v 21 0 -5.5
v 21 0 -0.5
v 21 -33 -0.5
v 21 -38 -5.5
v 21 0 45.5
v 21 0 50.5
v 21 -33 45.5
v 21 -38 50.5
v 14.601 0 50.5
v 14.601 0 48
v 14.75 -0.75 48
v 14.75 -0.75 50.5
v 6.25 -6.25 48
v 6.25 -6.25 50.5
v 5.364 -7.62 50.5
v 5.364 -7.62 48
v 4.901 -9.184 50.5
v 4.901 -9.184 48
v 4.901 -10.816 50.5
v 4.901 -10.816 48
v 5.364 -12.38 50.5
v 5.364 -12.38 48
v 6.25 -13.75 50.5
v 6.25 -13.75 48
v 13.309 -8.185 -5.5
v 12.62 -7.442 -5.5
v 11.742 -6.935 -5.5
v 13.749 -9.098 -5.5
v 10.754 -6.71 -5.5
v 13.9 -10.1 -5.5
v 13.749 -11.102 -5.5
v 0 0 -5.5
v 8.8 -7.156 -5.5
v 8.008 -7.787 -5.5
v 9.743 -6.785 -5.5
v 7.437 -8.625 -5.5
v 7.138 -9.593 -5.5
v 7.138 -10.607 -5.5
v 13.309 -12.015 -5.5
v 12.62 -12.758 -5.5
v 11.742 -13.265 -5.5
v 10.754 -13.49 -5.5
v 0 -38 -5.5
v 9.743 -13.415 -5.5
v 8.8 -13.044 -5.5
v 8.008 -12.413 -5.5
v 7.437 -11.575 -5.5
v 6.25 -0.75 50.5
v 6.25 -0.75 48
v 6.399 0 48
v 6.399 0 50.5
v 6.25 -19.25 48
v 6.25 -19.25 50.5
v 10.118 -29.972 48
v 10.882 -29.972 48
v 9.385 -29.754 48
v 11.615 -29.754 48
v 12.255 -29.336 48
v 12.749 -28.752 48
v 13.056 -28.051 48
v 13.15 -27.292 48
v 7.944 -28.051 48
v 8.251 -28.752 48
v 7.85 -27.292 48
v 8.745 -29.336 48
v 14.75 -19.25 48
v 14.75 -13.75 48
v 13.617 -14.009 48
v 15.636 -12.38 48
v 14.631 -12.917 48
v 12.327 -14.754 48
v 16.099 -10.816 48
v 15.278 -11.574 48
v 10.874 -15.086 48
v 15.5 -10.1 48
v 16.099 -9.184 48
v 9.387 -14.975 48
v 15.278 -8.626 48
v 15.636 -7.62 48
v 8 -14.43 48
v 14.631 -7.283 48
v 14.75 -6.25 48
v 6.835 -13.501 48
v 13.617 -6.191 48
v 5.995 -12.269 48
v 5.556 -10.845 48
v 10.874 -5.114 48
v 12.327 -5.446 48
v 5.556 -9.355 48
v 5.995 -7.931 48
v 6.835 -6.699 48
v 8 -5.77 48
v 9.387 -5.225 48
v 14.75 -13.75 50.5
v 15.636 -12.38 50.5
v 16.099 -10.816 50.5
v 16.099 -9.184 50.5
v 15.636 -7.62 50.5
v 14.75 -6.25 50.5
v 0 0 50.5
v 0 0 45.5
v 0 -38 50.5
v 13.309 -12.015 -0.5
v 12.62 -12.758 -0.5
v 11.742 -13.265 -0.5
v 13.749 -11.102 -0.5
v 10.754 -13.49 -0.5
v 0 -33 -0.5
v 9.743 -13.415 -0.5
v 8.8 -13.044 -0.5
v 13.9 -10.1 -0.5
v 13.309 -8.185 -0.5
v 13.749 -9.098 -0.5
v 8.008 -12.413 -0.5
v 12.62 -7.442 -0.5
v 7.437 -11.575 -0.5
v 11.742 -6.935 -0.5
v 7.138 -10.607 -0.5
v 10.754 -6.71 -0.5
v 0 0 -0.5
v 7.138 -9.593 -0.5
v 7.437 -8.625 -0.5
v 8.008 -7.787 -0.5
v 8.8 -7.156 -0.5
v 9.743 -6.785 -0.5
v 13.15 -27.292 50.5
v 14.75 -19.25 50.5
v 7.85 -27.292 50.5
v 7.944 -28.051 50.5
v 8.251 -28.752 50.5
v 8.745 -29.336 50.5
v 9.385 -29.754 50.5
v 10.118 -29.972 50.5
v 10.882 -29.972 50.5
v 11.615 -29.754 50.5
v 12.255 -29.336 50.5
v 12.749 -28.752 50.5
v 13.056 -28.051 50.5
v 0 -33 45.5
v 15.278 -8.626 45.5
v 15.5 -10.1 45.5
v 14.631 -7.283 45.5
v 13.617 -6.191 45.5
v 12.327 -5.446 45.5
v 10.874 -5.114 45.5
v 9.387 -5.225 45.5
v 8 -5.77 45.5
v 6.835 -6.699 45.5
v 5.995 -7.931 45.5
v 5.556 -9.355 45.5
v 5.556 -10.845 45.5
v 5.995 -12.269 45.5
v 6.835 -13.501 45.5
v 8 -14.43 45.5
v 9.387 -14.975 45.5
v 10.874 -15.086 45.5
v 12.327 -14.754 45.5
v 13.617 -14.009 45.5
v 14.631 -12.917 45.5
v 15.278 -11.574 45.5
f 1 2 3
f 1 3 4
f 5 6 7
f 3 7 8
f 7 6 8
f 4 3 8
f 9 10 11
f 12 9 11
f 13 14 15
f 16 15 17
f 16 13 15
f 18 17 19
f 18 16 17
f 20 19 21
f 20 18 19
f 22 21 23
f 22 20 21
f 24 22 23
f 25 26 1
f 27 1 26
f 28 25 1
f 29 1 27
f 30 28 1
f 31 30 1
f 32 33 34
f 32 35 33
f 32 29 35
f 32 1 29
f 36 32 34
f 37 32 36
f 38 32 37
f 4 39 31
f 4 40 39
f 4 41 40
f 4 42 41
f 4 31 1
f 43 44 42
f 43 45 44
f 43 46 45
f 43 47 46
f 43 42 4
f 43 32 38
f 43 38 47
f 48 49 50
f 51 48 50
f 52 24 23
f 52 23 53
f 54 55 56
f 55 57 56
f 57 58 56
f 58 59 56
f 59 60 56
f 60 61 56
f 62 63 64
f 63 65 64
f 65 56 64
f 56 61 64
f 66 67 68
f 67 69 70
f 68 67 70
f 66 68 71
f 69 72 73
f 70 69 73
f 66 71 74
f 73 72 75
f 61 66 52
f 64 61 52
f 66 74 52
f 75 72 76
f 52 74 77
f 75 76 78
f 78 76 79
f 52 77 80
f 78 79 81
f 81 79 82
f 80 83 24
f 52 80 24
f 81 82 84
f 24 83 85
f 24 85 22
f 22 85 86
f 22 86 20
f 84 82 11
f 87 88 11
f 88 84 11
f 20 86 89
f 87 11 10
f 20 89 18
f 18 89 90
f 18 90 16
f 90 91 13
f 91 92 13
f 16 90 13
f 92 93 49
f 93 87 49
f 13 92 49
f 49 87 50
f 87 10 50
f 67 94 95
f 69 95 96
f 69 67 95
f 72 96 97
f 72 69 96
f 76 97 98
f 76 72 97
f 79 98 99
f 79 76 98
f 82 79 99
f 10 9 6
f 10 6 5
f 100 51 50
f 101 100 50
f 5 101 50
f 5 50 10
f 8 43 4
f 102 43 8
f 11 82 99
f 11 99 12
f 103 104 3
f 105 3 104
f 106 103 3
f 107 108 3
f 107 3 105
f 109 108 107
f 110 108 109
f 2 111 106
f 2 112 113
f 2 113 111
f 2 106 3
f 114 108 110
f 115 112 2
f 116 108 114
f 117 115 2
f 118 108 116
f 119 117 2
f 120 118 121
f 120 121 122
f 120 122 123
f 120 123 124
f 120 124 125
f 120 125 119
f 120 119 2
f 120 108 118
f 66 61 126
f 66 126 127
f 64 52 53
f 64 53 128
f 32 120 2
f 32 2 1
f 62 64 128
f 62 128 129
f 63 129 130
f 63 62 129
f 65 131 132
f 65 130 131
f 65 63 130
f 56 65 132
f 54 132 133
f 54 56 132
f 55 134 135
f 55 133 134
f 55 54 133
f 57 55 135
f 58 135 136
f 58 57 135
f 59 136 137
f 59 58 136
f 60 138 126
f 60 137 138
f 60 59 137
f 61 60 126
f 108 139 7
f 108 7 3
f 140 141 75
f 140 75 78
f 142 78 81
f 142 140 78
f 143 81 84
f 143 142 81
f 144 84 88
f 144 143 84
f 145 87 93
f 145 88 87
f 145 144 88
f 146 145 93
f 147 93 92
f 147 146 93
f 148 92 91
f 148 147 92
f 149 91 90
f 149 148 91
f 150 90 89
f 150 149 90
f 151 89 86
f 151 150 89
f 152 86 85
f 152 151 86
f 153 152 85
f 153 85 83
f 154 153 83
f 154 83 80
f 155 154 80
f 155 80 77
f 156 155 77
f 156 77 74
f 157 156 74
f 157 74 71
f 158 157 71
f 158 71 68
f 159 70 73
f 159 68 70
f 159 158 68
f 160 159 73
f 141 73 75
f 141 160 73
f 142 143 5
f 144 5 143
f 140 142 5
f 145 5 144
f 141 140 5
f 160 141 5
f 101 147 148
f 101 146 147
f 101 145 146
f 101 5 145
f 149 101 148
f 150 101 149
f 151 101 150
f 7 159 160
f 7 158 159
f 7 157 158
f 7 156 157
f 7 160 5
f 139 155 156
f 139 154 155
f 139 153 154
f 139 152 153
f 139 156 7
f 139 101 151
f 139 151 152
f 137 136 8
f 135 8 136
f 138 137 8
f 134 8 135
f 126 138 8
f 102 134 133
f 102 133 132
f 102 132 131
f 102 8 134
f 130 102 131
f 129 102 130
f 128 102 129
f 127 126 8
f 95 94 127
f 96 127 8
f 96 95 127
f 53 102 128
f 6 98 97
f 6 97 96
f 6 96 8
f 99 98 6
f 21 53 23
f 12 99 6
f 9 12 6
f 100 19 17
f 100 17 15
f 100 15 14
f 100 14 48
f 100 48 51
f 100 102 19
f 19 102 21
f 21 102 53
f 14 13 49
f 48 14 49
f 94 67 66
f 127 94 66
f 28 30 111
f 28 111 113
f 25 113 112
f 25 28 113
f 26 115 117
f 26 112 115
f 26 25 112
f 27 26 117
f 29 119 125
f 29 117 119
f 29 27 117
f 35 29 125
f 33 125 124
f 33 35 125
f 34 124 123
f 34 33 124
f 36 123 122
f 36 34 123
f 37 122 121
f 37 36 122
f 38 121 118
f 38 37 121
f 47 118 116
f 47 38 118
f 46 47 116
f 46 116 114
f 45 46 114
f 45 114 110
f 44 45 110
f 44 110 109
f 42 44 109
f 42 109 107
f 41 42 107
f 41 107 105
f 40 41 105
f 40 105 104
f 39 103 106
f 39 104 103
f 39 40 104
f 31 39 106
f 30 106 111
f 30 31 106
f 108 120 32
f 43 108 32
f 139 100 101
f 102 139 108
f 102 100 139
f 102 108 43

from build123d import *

# Parameters (mm, degrees)
CYLINDER018_R     = 3.4
CYLINDER018_DEPTH = 44
CYLINDER017_R     = 5
CYLINDER017_DEPTH = 9
PAD006_DEPTH      = 5
PAD004_DEPTH      = 21


with BuildPart() as cylinder018:
    # Cylinder018 → Cylinder018 (new body)
    with BuildSketch(Plane(origin=(10.5, -10.1, -9), x_dir=(1, 0, 0), z_dir=(0, 0, 1))):
        Circle(CYLINDER018_R)
    extrude(amount=CYLINDER018_DEPTH)


with BuildPart() as cylinder017:
    # Cylinder017 → Cylinder017 (new body)
    with BuildSketch(Plane(origin=(10.5, -10.1, 44), x_dir=(1, 0, 0), z_dir=(0, 0, 1))):
        Circle(CYLINDER017_R)
    extrude(amount=CYLINDER017_DEPTH)


with BuildPart() as fusion014:
    # Sketch006 → Pad006 (new body)
    with BuildSketch(Plane.XY):
        with BuildLine():
            Line((-4.25, 3.75), (-4.25, 9.25))
            Line((-4.25, 9.25), (-2.65, 17.292388))
            ThreePointArc((2.65, 17.292388), (0, 20), (-2.65, 17.292388))
            Line((2.65, 17.292388), (4.25, 9.25))
            Line((4.25, 3.75), (4.25, 9.25))
            ThreePointArc((4.25, -3.75), (5.657274, 0), (4.25, 3.75))
            Line((4.25, -3.75), (4.25, -9.25))
            Line((2.65, -17.292388), (4.25, -9.25))
            ThreePointArc((-2.65, -17.292388), (0, -20), (2.65, -17.292388))
            Line((-4.25, -9.25), (-2.65, -17.292388))
            Line((-4.25, -3.75), (-4.25, -9.25))
            ThreePointArc((-4.25, 3.75), (-5.657274, 0), (-4.25, -3.75))
        make_face()
    extrude(amount=PAD006_DEPTH)


with BuildPart() as fusion014_1:
    # Body006 placement: moved
    add(fusion014.part.moved(Location((10.5, -10, 48))))

    # Fusion014: union Cylinder017
    add(cylinder017.part)


with BuildPart() as agarre:
    # Sketch004 → Pad004 (new body)
    with BuildSketch(Plane.YZ):
        Polygon((-33, -0.5), (0, -0.5), (0, -5.5), (-38, -5.5), (-38, 50.5), (0, 50.5), (0, 45.5), (-33, 45.5), align=None)
    extrude(amount=PAD004_DEPTH)

    # Cut008: cut Fusion014
    add(fusion014_1.part, mode=Mode.SUBTRACT)

    # Cut009: cut Cylinder018
    add(cylinder018.part, mode=Mode.SUBTRACT)


solid = agarre.part
